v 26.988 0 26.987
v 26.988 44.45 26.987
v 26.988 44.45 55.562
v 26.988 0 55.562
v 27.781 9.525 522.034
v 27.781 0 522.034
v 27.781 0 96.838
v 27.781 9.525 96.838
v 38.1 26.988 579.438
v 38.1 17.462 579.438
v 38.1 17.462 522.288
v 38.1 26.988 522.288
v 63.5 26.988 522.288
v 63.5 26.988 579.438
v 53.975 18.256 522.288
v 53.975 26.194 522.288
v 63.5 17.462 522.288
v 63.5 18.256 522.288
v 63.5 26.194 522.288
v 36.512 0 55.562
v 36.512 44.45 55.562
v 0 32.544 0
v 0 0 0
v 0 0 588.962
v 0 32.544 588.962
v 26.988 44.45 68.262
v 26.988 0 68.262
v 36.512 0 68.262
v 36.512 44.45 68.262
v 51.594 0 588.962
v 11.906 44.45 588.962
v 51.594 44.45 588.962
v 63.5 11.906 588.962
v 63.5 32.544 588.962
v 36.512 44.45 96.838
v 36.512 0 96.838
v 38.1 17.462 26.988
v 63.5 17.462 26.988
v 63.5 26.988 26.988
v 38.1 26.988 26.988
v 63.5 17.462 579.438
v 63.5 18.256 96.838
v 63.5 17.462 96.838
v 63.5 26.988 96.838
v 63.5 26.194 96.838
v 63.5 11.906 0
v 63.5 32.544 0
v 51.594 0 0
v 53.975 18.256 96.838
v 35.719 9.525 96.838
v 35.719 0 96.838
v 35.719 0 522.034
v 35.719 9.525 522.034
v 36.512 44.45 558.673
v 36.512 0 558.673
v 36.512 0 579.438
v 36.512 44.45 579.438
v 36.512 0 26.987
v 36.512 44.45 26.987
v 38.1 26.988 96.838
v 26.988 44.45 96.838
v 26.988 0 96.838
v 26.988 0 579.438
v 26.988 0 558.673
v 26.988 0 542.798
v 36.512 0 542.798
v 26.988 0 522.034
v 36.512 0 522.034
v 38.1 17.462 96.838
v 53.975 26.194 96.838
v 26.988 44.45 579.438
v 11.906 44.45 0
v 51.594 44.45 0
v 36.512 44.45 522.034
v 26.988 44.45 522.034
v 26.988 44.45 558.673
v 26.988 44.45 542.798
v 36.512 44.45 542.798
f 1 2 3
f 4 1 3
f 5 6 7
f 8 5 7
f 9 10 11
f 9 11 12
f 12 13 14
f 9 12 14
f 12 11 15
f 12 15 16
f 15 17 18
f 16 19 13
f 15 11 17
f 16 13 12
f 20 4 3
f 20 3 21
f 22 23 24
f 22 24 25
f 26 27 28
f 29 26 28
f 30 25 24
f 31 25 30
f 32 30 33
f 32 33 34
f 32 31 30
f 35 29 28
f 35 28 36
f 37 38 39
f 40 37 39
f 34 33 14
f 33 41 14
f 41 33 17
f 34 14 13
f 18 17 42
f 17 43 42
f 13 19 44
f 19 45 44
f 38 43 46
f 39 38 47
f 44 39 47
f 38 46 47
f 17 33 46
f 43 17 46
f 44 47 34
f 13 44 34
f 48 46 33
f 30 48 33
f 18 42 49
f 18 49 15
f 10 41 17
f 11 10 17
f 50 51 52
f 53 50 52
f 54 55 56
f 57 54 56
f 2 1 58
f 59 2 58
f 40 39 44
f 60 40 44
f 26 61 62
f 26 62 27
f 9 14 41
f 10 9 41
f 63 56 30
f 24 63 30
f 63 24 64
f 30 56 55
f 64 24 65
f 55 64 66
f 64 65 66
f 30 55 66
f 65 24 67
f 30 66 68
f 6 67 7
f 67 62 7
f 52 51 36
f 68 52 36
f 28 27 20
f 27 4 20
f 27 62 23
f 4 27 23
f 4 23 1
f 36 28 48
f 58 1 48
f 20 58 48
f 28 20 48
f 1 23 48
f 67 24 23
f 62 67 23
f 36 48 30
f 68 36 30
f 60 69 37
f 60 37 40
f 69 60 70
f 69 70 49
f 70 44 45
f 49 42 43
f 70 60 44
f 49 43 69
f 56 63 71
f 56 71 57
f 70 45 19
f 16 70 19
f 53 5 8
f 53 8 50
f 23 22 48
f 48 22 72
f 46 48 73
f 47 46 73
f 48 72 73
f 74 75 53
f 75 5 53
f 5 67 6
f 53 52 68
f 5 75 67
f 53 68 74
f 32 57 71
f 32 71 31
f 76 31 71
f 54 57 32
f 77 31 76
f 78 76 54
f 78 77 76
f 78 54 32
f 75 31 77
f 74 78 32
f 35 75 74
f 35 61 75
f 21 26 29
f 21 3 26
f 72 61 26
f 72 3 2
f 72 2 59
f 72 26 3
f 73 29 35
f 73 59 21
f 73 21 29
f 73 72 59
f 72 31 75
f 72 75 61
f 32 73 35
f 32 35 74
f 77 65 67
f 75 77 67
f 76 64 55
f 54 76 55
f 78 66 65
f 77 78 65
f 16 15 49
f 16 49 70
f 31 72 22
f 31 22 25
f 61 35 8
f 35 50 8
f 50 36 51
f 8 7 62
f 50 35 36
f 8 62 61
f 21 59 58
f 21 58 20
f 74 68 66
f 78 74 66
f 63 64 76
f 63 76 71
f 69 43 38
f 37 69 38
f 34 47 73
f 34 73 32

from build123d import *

# Parameters (mm, degrees)
F0_W     = 63.5
F0_H     = 44.45
F1_DEPTH = 588.9625
F3_DEPTH = 25.4
F2_W     = 7.9375
F2_H     = 425.45
F4_DEPTH = 9.525
F6_DEPTH = 9.525
F5_W     = 9.525
F5_H     = 20.7645
F5_H_2   = 28.575
F7_DEPTH = 44.451
F8_SIZE  = 11.90625


with BuildPart() as f1:
    # F0 (on Top) → F1 (new body)
    with BuildSketch(Plane.XY):
        with Locations((31.75, 22.225)):
            Rectangle(F0_W, F0_H)
    extrude(amount=F1_DEPTH)

    # F2 (on face) → F3 (cut)
    with BuildSketch(Plane.YZ.offset(63.5)):
        Polygon((26.9875, 579.4375), (17.4625, 579.4375), (17.4625, 522.2875), (18.25625, 522.2875), (26.19375, 522.2875), (26.9875, 522.2875), align=None)
        Polygon((26.19375, 96.8375), (18.25625, 96.8375), (17.4625, 96.8375), (17.4625, 26.9875), (26.9875, 26.9875), (26.9875, 96.8375), align=None)
    extrude(amount=-F3_DEPTH, mode=Mode.SUBTRACT)

    # F2 (on face) → F4 (cut)
    with BuildSketch(Plane.YZ.offset(63.5)):
        with Locations((22.225, 309.5625)):
            Rectangle(F2_W, F2_H)
    extrude(amount=-F4_DEPTH, mode=Mode.SUBTRACT)

    # F5 (on face) → F6 (cut)
    with BuildSketch(Plane.XZ):
        Polygon((35.71875, 522.0335), (28.575, 522.0335), (27.78125, 522.0335), (27.78125, 96.8375), (35.71875, 96.8375), align=None)
    extrude(amount=-F6_DEPTH, mode=Mode.SUBTRACT)

    # F5 (on face) → F7 (cut, through all)
    with BuildSketch(Plane.XZ):
        with Locations((31.75, 569.05525)):
            Rectangle(F5_W, F5_H)
        Polygon((27.78125, 522.0335), (28.575, 522.0335), (35.71875, 522.0335), (36.5125, 522.0335), (36.5125, 542.798), (26.9875, 542.798), (26.9875, 522.0335), align=None)
        Polygon((35.71875, 96.8375), (27.78125, 96.8375), (26.9875, 96.8375), (26.9875, 68.2625), (36.5125, 68.2625), (36.5125, 96.8375), align=None)
        with Locations((31.75, 41.275)):
            Rectangle(F5_W, F5_H_2)
    extrude(amount=-F7_DEPTH, mode=Mode.SUBTRACT)

    # F8
    f8_edges = [f1.edges().sort_by_distance(p)[0] for p in [
        (63.5, 44.45, 294.48125),
        (0, 44.45, 294.48125),
        (63.5, 0, 294.48125),
    ]]
    chamfer(f8_edges, length=F8_SIZE)


solid = f1.part
